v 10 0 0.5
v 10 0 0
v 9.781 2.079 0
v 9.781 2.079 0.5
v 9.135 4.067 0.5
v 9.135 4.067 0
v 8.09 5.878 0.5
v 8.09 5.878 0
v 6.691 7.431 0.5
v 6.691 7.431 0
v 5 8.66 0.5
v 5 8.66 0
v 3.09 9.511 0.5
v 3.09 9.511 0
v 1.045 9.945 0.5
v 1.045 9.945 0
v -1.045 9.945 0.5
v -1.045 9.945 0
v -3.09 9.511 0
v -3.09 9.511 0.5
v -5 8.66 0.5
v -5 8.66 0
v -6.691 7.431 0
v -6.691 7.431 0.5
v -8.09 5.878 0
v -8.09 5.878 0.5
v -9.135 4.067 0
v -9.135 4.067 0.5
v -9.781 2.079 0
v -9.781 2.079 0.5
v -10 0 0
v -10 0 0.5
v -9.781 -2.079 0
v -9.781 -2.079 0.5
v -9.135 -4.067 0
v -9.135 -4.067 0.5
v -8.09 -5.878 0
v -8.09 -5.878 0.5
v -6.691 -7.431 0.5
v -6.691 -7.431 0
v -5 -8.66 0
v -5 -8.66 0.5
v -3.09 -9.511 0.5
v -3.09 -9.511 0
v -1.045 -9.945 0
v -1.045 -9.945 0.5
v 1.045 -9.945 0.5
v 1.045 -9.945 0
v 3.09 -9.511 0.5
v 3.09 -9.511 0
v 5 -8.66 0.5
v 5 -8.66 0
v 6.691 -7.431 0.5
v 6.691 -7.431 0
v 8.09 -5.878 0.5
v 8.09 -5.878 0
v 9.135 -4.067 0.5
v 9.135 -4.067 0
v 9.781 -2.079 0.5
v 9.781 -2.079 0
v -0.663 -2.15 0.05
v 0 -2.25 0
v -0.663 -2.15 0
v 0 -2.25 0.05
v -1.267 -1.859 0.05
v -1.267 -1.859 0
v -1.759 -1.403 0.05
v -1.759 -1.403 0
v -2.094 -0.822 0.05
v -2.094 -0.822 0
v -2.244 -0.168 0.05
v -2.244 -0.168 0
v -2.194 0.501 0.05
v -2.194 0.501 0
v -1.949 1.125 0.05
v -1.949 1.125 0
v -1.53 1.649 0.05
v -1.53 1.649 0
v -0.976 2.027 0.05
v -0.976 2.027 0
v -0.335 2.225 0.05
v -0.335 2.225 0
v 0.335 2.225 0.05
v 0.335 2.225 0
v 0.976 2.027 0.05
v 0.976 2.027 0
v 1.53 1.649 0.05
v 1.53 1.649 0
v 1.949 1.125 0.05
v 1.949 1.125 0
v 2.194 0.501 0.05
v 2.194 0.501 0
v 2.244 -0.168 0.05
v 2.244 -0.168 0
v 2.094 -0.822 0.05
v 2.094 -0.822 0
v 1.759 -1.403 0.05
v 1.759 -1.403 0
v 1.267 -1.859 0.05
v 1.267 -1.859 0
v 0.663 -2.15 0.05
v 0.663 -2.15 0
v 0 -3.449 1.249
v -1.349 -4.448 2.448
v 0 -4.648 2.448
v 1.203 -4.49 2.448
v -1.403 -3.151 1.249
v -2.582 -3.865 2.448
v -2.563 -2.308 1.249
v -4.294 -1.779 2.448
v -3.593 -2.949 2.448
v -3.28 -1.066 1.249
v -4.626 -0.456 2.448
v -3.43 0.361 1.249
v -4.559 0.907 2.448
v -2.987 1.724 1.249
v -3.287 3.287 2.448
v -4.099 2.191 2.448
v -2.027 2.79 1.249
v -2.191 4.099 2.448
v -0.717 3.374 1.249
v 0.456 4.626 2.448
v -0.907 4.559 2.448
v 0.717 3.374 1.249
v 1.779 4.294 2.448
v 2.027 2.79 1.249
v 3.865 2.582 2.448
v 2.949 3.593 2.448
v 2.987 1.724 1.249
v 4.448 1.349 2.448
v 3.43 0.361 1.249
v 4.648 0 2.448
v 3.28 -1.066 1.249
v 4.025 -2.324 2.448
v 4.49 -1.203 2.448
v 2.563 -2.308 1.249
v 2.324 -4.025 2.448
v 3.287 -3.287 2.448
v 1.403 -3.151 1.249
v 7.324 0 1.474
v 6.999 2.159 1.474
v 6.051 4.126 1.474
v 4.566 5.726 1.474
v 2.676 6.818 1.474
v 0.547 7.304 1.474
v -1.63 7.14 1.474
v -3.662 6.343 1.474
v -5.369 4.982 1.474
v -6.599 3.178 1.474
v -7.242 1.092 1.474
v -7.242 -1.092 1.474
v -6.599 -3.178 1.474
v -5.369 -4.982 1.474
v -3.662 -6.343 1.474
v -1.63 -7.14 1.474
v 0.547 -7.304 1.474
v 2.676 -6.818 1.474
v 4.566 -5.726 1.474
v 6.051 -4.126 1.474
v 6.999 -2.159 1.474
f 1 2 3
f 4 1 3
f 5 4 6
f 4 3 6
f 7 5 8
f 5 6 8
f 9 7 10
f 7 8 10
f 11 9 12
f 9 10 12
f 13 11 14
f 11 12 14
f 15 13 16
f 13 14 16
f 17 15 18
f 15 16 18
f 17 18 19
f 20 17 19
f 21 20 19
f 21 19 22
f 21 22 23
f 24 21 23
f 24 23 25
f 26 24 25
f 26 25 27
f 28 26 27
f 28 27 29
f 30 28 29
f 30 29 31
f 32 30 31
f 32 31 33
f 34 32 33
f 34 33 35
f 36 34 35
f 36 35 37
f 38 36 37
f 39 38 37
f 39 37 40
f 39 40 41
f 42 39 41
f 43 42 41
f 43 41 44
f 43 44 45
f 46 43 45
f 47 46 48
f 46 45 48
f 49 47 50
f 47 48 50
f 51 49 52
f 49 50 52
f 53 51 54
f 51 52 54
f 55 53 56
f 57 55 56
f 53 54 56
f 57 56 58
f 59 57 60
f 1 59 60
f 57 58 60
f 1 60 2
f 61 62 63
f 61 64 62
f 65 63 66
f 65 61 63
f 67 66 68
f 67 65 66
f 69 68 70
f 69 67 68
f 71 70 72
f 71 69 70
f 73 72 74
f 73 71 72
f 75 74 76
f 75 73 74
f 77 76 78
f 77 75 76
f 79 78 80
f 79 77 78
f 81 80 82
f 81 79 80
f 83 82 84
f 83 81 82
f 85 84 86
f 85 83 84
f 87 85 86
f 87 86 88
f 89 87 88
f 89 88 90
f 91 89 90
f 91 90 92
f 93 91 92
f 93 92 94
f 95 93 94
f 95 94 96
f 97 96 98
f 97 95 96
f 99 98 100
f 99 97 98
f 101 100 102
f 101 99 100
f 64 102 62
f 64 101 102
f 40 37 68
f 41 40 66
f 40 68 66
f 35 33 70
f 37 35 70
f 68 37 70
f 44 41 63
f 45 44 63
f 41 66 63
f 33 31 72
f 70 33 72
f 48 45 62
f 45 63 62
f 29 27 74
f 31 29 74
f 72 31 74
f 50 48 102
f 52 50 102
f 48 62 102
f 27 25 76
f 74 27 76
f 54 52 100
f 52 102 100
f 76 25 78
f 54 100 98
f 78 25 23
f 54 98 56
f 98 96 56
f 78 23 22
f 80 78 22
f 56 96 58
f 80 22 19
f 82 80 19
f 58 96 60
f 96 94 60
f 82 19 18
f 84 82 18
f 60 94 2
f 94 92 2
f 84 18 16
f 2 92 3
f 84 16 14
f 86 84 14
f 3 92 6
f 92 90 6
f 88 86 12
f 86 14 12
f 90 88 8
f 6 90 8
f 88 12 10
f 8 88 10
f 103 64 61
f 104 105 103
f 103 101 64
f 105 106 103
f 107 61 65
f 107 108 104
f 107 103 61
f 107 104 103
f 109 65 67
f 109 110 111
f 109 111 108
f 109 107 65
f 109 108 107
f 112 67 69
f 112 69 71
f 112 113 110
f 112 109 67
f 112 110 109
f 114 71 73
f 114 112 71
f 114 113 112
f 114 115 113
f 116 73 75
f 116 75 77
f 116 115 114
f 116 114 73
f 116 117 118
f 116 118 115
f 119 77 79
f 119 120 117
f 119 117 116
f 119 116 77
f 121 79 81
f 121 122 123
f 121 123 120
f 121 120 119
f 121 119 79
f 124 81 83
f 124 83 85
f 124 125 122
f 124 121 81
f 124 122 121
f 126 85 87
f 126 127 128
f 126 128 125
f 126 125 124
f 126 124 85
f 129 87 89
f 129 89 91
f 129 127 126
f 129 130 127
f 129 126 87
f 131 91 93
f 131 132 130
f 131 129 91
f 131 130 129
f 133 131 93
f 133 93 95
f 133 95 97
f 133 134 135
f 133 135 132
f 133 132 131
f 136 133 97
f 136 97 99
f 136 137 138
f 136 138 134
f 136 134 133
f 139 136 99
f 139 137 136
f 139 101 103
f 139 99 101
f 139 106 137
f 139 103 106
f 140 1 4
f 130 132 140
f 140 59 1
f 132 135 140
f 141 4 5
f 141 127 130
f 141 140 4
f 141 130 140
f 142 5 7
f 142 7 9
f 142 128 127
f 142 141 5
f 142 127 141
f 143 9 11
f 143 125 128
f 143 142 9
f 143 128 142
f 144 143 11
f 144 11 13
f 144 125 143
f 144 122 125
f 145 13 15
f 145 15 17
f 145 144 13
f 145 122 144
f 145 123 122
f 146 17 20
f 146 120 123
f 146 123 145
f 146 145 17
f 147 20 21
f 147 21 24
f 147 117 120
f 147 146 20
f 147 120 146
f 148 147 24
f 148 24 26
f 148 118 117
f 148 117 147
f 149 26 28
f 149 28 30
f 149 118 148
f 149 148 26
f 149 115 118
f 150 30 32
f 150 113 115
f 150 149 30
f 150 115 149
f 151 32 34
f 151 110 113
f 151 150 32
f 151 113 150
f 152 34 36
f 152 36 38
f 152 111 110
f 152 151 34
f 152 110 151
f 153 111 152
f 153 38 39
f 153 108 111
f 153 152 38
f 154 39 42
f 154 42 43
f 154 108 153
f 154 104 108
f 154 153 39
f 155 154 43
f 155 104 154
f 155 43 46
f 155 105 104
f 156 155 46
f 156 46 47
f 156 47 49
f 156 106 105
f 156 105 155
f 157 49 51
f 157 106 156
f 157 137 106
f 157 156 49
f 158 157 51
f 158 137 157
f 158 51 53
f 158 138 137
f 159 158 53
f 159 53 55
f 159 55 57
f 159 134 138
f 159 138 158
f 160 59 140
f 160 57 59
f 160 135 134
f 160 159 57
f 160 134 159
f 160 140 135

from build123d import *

# Parameters (mm, degrees)
SKETCH1_R           = 10
BOSS_EXTRUDE1_DEPTH = 2.5
CHAMFER1_SIZE       = 2
CHAMFER1_SIZE_2     = 5.494954839


with BuildPart() as part:
    # Sketch1 → Boss-Extrude1 (new body)
    with BuildSketch(Plane.XY):
        Circle(SKETCH1_R)
    extrude(amount=BOSS_EXTRUDE1_DEPTH)

    # Sketch3 → CSK for M4 Flat Head Machine Screw1 (revolve, cut)
    with BuildSketch(Plane(origin=(0, 0, 2.5), x_dir=(0, -1, 0), z_dir=(1, 0, 0))):
        Polygon((0, 0), (0, 2.5), (2.25, 2.5), (2.25, 2.45), (4.7, 0), align=None)
    revolve(axis=Axis((0, 0, 8.85), (0, 0, -1)), mode=Mode.SUBTRACT)

    # Chamfer1
    # the kernel refuses this chamfer: 5.494954839, 2 mm, written as the material it takes off along each edge
    with BuildSketch(Plane(origin=(0, 0, 2.5), x_dir=(1, 0, 0), z_dir=(0, -1, 0))) as chamfer1_piece_1:
        Polygon((10, -CHAMFER1_SIZE), (10 - CHAMFER1_SIZE_2, 0), (10, 0), align=None)
    revolve(axis=Axis((0, 0, 2.5), (0, 0, 1)), mode=Mode.SUBTRACT)


solid = part.part
